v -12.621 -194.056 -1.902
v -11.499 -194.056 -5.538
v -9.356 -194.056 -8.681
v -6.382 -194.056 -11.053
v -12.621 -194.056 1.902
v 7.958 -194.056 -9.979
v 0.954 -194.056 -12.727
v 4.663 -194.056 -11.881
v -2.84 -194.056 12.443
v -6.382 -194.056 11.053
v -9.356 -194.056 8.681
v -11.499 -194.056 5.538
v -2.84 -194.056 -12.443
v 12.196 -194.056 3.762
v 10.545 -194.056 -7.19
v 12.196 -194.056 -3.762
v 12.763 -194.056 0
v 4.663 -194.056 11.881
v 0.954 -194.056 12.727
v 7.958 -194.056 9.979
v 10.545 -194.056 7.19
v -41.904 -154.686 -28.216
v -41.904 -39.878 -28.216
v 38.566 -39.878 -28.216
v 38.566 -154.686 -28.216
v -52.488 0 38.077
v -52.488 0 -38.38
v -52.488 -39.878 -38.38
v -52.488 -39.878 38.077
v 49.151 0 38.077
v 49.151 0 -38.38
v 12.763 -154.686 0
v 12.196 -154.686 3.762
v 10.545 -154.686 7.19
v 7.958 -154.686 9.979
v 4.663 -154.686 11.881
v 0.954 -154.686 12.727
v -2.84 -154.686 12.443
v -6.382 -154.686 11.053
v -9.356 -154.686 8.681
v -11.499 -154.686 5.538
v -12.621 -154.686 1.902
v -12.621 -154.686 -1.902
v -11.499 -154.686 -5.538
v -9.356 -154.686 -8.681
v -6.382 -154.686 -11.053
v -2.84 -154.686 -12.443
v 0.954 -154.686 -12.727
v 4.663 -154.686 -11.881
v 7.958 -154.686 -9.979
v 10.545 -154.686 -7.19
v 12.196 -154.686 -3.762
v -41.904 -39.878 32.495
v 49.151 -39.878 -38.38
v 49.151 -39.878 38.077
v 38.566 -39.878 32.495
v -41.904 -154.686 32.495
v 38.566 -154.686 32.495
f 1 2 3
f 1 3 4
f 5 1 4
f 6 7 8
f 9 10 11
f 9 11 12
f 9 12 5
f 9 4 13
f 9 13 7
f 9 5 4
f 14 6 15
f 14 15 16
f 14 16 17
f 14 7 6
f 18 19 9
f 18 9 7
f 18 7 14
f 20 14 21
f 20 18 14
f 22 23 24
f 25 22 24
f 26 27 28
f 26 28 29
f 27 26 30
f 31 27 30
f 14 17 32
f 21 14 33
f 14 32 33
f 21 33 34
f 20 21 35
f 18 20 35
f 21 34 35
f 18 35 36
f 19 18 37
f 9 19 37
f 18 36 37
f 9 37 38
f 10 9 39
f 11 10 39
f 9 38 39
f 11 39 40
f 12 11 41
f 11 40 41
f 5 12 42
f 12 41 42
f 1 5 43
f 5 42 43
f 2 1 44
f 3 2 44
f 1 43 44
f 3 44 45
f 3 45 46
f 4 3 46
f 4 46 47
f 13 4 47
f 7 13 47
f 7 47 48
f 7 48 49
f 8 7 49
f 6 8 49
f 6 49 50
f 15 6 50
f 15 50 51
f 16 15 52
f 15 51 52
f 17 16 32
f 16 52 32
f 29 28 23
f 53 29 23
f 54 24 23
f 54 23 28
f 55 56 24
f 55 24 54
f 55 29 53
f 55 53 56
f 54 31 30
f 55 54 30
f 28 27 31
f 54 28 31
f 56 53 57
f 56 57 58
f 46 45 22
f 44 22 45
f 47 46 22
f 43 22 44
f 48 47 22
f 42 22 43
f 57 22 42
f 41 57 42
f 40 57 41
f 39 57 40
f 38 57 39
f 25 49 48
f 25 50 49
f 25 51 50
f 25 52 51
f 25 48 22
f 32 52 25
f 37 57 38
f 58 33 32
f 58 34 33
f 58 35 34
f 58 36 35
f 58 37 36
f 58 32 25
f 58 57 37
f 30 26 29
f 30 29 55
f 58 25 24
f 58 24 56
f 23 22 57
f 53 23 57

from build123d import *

# Parameters (mm, degrees)
F0_W     = 101.638708
F0_H     = 76.456577
F1_DEPTH = 39.878
F2_W     = 80.470148
F2_H     = 60.710575
F3_DEPTH = 114.808
F4_R     = 12.763073
F5_DEPTH = 39.37
F6_W     = 52.336872
F6_H     = 92.136786
F7_DEPTH = 27.94


with BuildPart() as f1:
    # F0 (on Front) → F1 (new body)
    with BuildSketch(Plane.XZ):
        with Locations((-1.668697, -0.151697)):
            Rectangle(F0_W, F0_H)
    extrude(amount=F1_DEPTH)

    # F2 (on face) → F3 (join)
    with BuildSketch(Plane.XZ.offset(39.878)):
        with Locations((-1.668697, 2.139264)):
            Rectangle(F2_W, F2_H)
    extrude(amount=F3_DEPTH)

    # F4 (on face) → F5 (join)
    with BuildSketch(Plane.XZ.offset(154.686)):
        Circle(F4_R)
    extrude(amount=F5_DEPTH)

    # F6 (on face) → F7 (join)
    with BuildSketch(Plane.XY.offset(32.494552)):
        with Locations((-0.389457, -95.996715)):
            Rectangle(F6_W, F6_H)
    extrude(amount=-F7_DEPTH)


solid = f1.part
